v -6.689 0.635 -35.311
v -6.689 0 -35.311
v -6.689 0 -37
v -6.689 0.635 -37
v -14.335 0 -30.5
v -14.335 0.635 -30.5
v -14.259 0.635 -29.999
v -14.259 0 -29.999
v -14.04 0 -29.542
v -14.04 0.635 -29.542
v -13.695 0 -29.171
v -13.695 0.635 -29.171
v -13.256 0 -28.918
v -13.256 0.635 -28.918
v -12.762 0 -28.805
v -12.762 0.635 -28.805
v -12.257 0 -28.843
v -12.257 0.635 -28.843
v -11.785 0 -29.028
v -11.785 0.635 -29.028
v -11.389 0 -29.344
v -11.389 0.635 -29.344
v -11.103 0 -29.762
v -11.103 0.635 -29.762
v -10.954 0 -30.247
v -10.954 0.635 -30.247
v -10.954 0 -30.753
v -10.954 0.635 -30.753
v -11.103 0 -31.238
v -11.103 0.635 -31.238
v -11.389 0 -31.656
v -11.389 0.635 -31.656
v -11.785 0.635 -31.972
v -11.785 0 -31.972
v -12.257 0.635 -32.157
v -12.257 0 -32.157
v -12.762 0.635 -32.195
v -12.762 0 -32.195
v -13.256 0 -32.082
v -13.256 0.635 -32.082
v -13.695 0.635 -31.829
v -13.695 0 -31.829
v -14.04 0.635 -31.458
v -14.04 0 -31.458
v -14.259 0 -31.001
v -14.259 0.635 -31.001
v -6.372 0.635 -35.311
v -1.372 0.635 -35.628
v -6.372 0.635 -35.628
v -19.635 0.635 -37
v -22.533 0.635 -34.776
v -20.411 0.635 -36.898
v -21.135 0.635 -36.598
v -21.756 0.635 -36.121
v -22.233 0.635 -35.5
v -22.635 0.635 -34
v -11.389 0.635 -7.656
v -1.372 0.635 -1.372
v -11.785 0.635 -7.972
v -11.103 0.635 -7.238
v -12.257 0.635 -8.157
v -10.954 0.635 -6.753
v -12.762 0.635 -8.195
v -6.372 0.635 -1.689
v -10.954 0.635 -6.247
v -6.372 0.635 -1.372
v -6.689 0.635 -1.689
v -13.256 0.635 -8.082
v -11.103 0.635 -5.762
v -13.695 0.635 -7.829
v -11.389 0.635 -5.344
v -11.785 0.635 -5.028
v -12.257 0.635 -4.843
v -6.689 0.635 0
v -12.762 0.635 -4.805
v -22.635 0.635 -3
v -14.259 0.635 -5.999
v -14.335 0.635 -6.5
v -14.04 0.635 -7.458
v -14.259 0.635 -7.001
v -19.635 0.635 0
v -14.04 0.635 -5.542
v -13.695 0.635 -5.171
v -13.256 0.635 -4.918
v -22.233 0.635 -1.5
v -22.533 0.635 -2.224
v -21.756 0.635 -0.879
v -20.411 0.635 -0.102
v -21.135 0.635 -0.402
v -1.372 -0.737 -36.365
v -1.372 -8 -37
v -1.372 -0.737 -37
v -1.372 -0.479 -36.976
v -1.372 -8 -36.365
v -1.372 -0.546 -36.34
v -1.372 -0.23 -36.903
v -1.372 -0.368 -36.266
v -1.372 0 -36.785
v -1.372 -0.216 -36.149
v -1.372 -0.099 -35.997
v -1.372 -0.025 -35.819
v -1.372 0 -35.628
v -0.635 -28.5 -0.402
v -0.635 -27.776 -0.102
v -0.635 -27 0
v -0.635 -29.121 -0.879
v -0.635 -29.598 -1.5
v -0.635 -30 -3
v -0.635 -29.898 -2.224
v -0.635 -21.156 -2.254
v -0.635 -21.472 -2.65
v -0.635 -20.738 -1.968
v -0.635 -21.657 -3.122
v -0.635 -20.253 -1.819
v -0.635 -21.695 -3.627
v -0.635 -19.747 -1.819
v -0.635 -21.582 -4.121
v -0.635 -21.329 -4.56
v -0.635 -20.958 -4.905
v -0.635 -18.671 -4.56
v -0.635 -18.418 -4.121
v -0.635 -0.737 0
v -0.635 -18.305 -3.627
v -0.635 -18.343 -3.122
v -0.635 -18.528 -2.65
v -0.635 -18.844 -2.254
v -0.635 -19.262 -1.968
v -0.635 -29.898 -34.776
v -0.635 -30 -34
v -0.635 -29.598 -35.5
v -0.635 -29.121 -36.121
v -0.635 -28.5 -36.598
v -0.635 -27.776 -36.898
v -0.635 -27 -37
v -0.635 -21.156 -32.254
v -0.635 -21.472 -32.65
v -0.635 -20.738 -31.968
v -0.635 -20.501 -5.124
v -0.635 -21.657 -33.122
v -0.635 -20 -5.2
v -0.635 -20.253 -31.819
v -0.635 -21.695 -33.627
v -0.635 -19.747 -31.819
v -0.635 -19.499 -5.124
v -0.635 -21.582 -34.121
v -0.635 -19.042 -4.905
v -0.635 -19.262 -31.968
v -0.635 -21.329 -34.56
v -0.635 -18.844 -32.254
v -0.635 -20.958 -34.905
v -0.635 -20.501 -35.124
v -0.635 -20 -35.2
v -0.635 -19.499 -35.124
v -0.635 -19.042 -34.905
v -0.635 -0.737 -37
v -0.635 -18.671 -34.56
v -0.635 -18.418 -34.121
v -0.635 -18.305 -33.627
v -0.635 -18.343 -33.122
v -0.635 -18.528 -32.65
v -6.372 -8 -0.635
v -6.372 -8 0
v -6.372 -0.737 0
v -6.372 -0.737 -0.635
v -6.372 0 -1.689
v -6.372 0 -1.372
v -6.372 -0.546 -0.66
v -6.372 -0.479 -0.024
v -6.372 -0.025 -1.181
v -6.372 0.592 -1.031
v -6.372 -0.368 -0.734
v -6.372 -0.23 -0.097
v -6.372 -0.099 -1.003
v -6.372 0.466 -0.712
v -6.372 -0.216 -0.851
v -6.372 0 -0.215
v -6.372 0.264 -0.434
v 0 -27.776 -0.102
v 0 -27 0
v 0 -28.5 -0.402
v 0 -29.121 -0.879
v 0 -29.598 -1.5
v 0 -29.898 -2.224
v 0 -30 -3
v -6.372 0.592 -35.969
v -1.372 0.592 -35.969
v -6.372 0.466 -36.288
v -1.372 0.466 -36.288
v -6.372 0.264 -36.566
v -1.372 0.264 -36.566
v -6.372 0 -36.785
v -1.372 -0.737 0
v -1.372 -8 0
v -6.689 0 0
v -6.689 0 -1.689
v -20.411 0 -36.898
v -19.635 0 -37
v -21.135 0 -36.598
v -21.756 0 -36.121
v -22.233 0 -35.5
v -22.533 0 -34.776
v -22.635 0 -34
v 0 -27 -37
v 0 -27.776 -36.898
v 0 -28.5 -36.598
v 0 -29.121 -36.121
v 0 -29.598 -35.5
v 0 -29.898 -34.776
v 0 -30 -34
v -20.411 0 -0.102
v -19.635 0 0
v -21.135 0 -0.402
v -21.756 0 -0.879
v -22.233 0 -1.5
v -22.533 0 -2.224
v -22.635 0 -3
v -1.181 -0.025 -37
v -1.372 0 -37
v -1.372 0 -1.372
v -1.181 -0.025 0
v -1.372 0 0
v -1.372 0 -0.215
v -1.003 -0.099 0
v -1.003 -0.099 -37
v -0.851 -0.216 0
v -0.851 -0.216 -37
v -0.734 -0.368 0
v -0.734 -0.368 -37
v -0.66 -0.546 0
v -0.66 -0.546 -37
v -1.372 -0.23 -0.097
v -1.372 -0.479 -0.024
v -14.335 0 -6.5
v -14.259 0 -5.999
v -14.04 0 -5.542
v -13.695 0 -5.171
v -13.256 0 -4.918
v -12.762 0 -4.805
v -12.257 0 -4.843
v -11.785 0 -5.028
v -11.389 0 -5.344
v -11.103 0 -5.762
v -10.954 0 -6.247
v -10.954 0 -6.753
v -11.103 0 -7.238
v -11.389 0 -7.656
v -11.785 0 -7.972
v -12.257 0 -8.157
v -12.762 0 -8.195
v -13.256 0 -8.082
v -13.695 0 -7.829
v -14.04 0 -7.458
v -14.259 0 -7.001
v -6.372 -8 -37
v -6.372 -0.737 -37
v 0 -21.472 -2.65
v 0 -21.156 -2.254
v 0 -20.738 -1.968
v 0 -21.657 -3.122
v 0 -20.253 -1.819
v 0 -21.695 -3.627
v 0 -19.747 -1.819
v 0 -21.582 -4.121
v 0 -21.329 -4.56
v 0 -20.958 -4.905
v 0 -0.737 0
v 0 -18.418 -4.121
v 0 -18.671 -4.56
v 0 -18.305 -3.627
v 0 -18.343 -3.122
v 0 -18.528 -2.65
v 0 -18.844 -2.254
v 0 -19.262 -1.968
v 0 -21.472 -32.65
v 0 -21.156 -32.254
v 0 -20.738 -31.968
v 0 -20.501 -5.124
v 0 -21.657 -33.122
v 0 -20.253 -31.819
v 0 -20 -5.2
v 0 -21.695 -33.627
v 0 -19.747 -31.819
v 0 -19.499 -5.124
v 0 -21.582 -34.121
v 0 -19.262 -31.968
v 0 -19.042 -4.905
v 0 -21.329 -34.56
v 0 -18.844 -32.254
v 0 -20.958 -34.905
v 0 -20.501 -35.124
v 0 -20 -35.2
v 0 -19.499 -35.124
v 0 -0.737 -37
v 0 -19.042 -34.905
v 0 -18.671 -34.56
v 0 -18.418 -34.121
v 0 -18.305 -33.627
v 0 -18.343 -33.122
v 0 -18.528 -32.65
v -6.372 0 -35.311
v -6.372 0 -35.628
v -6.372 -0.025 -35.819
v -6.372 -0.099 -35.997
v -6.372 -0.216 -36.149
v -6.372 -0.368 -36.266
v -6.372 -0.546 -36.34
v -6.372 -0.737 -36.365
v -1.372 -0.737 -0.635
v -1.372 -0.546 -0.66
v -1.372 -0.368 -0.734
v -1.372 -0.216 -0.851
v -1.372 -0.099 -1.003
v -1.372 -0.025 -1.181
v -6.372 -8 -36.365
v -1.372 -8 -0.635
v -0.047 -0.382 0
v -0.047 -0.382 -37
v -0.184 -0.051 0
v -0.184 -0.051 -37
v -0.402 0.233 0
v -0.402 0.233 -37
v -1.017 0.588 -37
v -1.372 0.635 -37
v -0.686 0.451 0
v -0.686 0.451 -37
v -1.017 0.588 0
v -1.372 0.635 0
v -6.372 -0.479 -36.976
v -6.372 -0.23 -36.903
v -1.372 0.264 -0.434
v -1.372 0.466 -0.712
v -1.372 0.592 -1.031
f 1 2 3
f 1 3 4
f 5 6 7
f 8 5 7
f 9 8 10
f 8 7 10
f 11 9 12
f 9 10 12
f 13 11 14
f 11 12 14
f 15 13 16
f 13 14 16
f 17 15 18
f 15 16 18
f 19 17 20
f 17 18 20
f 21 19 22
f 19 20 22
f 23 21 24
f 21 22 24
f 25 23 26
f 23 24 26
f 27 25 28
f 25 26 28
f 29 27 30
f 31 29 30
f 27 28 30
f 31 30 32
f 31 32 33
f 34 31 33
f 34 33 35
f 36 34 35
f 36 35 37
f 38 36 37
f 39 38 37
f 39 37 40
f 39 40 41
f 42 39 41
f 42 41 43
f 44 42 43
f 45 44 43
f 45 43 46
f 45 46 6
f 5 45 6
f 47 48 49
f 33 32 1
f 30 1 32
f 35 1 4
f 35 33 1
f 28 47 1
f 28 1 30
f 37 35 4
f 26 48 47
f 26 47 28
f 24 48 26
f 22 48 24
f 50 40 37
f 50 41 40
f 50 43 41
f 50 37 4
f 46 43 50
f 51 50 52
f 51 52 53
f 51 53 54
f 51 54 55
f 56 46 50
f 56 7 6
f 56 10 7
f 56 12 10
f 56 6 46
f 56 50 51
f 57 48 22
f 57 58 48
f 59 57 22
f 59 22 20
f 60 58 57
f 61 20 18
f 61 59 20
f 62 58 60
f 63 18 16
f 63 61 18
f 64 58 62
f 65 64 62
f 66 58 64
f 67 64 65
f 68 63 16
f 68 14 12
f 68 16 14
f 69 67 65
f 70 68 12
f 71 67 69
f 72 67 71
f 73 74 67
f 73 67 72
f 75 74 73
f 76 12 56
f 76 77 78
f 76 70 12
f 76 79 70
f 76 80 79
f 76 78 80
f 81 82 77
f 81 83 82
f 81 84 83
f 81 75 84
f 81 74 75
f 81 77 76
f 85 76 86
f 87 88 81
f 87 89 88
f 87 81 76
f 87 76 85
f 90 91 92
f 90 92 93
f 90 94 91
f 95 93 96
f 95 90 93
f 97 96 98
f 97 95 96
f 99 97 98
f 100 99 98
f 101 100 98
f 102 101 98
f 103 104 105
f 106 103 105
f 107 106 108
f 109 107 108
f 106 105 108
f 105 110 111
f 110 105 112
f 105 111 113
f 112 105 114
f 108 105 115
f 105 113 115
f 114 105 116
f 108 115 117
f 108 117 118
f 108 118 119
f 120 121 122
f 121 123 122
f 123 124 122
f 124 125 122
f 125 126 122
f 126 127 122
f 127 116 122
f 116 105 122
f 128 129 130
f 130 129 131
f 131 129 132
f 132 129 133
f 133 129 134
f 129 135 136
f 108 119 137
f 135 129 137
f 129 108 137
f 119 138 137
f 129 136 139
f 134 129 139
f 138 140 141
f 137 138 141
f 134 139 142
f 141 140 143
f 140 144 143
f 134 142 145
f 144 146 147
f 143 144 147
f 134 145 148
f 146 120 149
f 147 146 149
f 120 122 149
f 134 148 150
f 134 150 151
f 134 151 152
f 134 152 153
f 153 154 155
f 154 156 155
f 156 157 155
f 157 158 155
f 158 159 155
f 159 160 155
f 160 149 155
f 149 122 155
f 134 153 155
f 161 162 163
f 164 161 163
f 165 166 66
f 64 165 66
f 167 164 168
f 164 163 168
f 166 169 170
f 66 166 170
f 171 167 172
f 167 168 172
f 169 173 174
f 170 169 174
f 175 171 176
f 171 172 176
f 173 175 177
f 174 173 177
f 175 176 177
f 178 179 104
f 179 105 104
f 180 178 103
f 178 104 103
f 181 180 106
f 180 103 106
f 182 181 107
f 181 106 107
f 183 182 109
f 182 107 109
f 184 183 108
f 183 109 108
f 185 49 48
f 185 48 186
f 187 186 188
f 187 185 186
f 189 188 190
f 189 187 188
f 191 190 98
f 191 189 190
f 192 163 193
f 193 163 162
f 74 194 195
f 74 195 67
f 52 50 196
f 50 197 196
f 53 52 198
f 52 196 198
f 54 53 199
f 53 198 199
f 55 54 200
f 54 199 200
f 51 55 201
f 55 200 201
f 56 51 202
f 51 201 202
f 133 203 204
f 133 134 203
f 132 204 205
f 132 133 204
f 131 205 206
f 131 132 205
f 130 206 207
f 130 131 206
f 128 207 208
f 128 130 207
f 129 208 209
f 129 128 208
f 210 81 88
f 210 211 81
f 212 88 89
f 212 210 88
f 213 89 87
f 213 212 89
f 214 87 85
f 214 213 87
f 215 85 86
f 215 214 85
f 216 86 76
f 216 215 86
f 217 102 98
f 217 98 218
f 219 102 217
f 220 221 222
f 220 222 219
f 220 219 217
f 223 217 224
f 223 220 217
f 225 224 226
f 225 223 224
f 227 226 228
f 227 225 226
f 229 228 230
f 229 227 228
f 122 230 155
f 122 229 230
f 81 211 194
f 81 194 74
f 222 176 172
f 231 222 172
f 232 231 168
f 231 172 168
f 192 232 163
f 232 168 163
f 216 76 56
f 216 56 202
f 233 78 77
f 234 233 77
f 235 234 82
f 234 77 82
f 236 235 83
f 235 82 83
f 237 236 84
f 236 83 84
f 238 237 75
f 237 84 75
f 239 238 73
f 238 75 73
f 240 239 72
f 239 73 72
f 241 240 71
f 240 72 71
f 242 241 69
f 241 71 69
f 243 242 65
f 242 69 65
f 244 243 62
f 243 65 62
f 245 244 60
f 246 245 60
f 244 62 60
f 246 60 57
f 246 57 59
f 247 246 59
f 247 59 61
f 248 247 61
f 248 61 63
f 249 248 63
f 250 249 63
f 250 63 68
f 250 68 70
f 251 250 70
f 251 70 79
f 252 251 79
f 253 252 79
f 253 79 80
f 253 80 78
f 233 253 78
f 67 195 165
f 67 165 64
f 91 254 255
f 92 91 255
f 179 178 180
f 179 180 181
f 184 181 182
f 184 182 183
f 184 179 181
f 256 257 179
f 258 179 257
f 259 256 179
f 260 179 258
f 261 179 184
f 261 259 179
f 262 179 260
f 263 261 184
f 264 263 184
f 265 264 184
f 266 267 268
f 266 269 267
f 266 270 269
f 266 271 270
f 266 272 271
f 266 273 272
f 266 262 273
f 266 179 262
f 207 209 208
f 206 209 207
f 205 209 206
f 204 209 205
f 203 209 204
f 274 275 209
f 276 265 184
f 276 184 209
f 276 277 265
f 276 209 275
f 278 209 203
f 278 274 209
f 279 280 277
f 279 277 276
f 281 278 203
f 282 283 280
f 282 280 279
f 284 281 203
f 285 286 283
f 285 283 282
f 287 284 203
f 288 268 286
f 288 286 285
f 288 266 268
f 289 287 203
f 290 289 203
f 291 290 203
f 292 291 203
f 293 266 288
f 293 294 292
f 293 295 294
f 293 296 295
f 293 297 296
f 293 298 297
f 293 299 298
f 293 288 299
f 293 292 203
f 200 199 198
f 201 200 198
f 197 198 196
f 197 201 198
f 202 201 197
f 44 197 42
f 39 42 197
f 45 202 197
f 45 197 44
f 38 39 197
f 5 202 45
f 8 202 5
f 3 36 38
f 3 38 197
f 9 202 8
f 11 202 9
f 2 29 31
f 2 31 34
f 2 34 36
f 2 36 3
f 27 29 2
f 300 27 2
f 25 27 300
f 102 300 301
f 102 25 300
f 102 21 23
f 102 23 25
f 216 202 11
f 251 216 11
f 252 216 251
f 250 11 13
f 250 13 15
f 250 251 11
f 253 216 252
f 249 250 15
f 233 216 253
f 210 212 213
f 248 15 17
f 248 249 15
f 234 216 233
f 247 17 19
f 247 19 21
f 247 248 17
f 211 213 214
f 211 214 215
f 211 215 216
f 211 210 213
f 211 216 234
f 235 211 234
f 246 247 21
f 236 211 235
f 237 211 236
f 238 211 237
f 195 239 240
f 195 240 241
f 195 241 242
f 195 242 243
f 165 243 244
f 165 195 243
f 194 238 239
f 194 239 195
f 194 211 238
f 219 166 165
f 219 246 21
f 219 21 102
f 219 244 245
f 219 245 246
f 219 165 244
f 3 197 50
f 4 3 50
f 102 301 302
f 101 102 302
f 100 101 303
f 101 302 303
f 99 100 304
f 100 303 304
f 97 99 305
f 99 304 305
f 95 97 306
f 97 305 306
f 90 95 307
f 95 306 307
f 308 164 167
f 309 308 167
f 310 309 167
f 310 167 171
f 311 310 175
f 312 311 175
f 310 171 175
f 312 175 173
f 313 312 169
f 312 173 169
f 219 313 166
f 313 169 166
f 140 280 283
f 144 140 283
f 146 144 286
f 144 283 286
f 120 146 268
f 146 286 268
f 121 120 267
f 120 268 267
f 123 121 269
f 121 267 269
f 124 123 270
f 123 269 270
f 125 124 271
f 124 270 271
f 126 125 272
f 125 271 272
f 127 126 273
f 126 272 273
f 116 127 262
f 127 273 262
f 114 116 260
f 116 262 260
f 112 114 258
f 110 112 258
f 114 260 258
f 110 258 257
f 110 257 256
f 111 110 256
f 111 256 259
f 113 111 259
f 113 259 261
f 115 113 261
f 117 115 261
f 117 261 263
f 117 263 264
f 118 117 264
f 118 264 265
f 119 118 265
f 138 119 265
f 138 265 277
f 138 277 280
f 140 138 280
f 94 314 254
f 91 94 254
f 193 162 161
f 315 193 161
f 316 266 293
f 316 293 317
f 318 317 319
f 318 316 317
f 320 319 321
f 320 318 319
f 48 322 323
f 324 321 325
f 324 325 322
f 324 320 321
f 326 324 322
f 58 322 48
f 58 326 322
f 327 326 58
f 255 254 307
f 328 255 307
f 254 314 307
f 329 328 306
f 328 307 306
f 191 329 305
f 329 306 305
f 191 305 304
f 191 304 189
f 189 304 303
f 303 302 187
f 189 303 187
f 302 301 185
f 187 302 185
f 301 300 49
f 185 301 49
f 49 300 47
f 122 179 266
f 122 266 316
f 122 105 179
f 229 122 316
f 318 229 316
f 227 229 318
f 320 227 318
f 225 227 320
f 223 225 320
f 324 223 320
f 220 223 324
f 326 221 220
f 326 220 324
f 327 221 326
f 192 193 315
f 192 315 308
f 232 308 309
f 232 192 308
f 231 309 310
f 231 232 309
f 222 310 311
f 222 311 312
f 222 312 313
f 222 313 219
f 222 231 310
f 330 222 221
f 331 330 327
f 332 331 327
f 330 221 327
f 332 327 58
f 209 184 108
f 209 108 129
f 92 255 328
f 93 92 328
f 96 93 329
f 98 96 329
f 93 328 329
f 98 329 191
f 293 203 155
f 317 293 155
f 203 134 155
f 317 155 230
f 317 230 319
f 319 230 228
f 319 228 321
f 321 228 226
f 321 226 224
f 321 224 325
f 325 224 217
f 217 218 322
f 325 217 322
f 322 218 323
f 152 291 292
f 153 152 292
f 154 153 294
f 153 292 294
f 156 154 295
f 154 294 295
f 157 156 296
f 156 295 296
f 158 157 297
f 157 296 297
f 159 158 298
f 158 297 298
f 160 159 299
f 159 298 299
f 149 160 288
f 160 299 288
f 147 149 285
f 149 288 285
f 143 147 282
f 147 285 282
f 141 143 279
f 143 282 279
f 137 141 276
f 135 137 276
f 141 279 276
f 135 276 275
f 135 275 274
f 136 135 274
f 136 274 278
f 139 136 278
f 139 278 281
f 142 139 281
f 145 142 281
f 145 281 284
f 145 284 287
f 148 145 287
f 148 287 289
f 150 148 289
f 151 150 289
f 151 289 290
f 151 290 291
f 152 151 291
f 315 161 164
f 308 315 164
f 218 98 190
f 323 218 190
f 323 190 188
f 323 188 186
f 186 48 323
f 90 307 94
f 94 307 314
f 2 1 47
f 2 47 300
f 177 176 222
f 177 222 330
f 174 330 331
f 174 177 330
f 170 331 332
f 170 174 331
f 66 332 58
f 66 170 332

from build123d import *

# Parameters (mm, degrees)
SKETCH2_W                    = 37
SKETCH2_H                    = 30
BASE_FLANGE1_DEPTH           = 0.635
EDGE_FLANGE1_STRIP_W         = 4.0132
EDGE_FLANGE1_STRIP_H         = 0.635
EDGE_FLANGE1_STRIP_CUT_DEPTH = 37
EDGE_FLANGE1_DEPTH           = 37
EDGE_FLANGE2_START           = -6.6891
EDGE_FLANGE2_DEPTH           = 5.3175
EDGE_FLANGE2_2_DEPTH         = 0.3175
EDGE_FLANGE2_START_2         = -6.3716
EDGE_FLANGE2_3_DEPTH         = 5
EDGE_FLANGE3_START           = -6.6891
EDGE_FLANGE3_DEPTH           = 5.3175
EDGE_FLANGE3_2_DEPTH         = 0.3175
EDGE_FLANGE3_START_2         = -6.3716
EDGE_FLANGE3_3_DEPTH         = 5
SKETCH14_R                   = 1.7
CUT_EXTRUDE1_DEPTH           = 10
FILLET1_R                    = 3
SKETCH15_R                   = 1.7
CUT_EXTRUDE2_DEPTH           = 10


# Read off the part's stored shape, not the designer's step: Edge-Flange2, Edge-Flange3
# Sheet-metal steps are written as plain solids
with BuildPart() as part:
    # Sketch2 → Base-Flange1 (new body)
    with BuildSketch(Plane(origin=(0, 0, 0), x_dir=(0, 0, -1), z_dir=(1, 0, 0))):
        with Locations((18.5, -15)):
            Rectangle(SKETCH2_W, SKETCH2_H)
    extrude(amount=-BASE_FLANGE1_DEPTH)

    # Edge-Flange1 strip (across the edge) → Edge-Flange1 strip cut (cut)
    with BuildSketch(Plane(origin=(-0.635, 0, 0), x_dir=(0, -1, 0), z_dir=(0, 0, -1))):
        with Locations((-1.27, -0.3175)):
            Rectangle(EDGE_FLANGE1_STRIP_W, EDGE_FLANGE1_STRIP_H)
    extrude(amount=EDGE_FLANGE1_STRIP_CUT_DEPTH, mode=Mode.SUBTRACT)

    # Edge-Flange1 section (across the edge) → Edge-Flange1 (add)
    with BuildSketch(Plane(origin=(-0.635, 0, 0), x_dir=(0, -1, 0), z_dir=(0, 0, -1))):
        with BuildLine():
            Line((-0.635, 0.7366), (-0.635, 22))
            Line((-0.635, 22), (0, 22))
            Line((0, 22), (0, 0.7366))
            ThreePointArc((0, 0.7366), (0.215745145, 0.215745145), (0.7366, 0))
            Line((0.7366, 0), (0.7366, -0.635))
            ThreePointArc((0.7366, -0.635), (-0.233267661, -0.233267661), (-0.635, 0.7366))
        make_face()
    extrude(amount=EDGE_FLANGE1_DEPTH)

    # Edge-Flange2 outline → Edge-Flange2 (cut)
    with BuildSketch(Plane.YZ.offset(EDGE_FLANGE2_START)):
        with BuildLine():
            Line((0, 0), (0, -0.214574936))
            ThreePointArc((0, -0.214574936), (0.465815718, -0.711688642), (0.635, -1.3716))
            Line((0.635, -1.3716), (0.635, 0))
            Line((0.635, 0), (0, 0))
        make_face()
    extrude(amount=EDGE_FLANGE2_DEPTH, mode=Mode.SUBTRACT)

    # Edge-Flange2 2 outline → Edge-Flange2 2 (cut)
    with BuildSketch(Plane.YZ.offset(EDGE_FLANGE2_START)):
        with BuildLine():
            ThreePointArc((0.635, -1.3716), (0.465815718, -0.711688642), (0, -0.214574936))
            Line((0, -0.214574936), (0, -1.6891))
            Line((0, -1.6891), (0.635, -1.6891))
            Line((0.635, -1.6891), (0.635, -1.3716))
        make_face()
    extrude(amount=EDGE_FLANGE2_2_DEPTH, mode=Mode.SUBTRACT)

    # Edge-Flange2 3 outline → Edge-Flange2 3 (add)
    with BuildSketch(Plane.YZ.offset(EDGE_FLANGE2_START_2)):
        with BuildLine():
            Line((-0.7366, 0), (-8, 0))
            Line((-8, 0), (-8, -0.635))
            Line((-8, -0.635), (-0.7366, -0.635))
            ThreePointArc((-0.7366, -0.635), (-0.215745145, -0.850745145), (0, -1.3716))
            Line((0, -1.3716), (0, -0.214574936))
            ThreePointArc((0, -0.214574936), (-0.352991488, -0.054735896), (-0.7366, 0))
        make_face()
    extrude(amount=EDGE_FLANGE2_3_DEPTH)

    # Edge-Flange3 outline → Edge-Flange3 (cut)
    with BuildSketch(Plane.YZ.offset(EDGE_FLANGE3_START)):
        with BuildLine():
            ThreePointArc((0.635, -35.6284), (0.465815718, -36.288311358), (0, -36.785425064))
            Line((0, -36.785425064), (0, -37))
            Line((0, -37), (0.635, -37))
            Line((0.635, -37), (0.635, -35.6284))
        make_face()
    extrude(amount=EDGE_FLANGE3_DEPTH, mode=Mode.SUBTRACT)

    # Edge-Flange3 2 outline → Edge-Flange3 2 (cut)
    with BuildSketch(Plane.YZ.offset(EDGE_FLANGE3_START)):
        with BuildLine():
            Line((0, -35.3109), (0, -36.785425064))
            ThreePointArc((0, -36.785425064), (0.465815718, -36.288311358), (0.635, -35.6284))
            Line((0.635, -35.6284), (0.635, -35.3109))
            Line((0.635, -35.3109), (0, -35.3109))
        make_face()
    extrude(amount=EDGE_FLANGE3_2_DEPTH, mode=Mode.SUBTRACT)

    # Edge-Flange3 3 outline → Edge-Flange3 3 (add)
    with BuildSketch(Plane.YZ.offset(EDGE_FLANGE3_START_2)):
        with BuildLine():
            Line((-8, -37), (-0.7366, -37))
            ThreePointArc((-0.7366, -37), (-0.352991488, -36.945264104), (0, -36.785425064))
            Line((0, -36.785425064), (0, -35.6284))
            ThreePointArc((0, -35.6284), (-0.215745145, -36.149254855), (-0.7366, -36.365))
            Line((-0.7366, -36.365), (-8, -36.365))
            Line((-8, -36.365), (-8, -37))
        make_face()
    extrude(amount=EDGE_FLANGE3_3_DEPTH)

    # Sketch14 → Cut-Extrude1 (cut)
    with BuildSketch(Plane(origin=(0, 0, 0), x_dir=(0, 0, -1), z_dir=(1, 0, 0))):
        with Locations((3.5, -20)):
            Circle(SKETCH14_R)
        with Locations((33.5, -20)):
            Circle(SKETCH14_R)
    extrude(amount=-CUT_EXTRUDE1_DEPTH, mode=Mode.SUBTRACT)

    # Fillet1
    fillet1_edges = [part.edges().sort_by_distance(p)[0] for p in [
        (-22.635, 0.3175, 0),
        (-22.635, 0.3175, -37),
        (-0.3175, -30, -37),
        (-0.3175, -30, 0),
    ]]
    fillet(fillet1_edges, radius=FILLET1_R)

    # Sketch15 → Cut-Extrude2 (cut)
    with BuildSketch(Plane(origin=(0, 0.635, 0), x_dir=(1, 0, 0), z_dir=(0, 1, 0))):
        with Locations(Location((-12.635, 30.5, 0), (0, 0, 180))):
            Circle(SKETCH15_R)
        with Locations(Location((-12.635, 6.5, 0), (0, 0, 180))):
            Circle(SKETCH15_R)
    extrude(amount=-CUT_EXTRUDE2_DEPTH, mode=Mode.SUBTRACT)


solid = part.part
